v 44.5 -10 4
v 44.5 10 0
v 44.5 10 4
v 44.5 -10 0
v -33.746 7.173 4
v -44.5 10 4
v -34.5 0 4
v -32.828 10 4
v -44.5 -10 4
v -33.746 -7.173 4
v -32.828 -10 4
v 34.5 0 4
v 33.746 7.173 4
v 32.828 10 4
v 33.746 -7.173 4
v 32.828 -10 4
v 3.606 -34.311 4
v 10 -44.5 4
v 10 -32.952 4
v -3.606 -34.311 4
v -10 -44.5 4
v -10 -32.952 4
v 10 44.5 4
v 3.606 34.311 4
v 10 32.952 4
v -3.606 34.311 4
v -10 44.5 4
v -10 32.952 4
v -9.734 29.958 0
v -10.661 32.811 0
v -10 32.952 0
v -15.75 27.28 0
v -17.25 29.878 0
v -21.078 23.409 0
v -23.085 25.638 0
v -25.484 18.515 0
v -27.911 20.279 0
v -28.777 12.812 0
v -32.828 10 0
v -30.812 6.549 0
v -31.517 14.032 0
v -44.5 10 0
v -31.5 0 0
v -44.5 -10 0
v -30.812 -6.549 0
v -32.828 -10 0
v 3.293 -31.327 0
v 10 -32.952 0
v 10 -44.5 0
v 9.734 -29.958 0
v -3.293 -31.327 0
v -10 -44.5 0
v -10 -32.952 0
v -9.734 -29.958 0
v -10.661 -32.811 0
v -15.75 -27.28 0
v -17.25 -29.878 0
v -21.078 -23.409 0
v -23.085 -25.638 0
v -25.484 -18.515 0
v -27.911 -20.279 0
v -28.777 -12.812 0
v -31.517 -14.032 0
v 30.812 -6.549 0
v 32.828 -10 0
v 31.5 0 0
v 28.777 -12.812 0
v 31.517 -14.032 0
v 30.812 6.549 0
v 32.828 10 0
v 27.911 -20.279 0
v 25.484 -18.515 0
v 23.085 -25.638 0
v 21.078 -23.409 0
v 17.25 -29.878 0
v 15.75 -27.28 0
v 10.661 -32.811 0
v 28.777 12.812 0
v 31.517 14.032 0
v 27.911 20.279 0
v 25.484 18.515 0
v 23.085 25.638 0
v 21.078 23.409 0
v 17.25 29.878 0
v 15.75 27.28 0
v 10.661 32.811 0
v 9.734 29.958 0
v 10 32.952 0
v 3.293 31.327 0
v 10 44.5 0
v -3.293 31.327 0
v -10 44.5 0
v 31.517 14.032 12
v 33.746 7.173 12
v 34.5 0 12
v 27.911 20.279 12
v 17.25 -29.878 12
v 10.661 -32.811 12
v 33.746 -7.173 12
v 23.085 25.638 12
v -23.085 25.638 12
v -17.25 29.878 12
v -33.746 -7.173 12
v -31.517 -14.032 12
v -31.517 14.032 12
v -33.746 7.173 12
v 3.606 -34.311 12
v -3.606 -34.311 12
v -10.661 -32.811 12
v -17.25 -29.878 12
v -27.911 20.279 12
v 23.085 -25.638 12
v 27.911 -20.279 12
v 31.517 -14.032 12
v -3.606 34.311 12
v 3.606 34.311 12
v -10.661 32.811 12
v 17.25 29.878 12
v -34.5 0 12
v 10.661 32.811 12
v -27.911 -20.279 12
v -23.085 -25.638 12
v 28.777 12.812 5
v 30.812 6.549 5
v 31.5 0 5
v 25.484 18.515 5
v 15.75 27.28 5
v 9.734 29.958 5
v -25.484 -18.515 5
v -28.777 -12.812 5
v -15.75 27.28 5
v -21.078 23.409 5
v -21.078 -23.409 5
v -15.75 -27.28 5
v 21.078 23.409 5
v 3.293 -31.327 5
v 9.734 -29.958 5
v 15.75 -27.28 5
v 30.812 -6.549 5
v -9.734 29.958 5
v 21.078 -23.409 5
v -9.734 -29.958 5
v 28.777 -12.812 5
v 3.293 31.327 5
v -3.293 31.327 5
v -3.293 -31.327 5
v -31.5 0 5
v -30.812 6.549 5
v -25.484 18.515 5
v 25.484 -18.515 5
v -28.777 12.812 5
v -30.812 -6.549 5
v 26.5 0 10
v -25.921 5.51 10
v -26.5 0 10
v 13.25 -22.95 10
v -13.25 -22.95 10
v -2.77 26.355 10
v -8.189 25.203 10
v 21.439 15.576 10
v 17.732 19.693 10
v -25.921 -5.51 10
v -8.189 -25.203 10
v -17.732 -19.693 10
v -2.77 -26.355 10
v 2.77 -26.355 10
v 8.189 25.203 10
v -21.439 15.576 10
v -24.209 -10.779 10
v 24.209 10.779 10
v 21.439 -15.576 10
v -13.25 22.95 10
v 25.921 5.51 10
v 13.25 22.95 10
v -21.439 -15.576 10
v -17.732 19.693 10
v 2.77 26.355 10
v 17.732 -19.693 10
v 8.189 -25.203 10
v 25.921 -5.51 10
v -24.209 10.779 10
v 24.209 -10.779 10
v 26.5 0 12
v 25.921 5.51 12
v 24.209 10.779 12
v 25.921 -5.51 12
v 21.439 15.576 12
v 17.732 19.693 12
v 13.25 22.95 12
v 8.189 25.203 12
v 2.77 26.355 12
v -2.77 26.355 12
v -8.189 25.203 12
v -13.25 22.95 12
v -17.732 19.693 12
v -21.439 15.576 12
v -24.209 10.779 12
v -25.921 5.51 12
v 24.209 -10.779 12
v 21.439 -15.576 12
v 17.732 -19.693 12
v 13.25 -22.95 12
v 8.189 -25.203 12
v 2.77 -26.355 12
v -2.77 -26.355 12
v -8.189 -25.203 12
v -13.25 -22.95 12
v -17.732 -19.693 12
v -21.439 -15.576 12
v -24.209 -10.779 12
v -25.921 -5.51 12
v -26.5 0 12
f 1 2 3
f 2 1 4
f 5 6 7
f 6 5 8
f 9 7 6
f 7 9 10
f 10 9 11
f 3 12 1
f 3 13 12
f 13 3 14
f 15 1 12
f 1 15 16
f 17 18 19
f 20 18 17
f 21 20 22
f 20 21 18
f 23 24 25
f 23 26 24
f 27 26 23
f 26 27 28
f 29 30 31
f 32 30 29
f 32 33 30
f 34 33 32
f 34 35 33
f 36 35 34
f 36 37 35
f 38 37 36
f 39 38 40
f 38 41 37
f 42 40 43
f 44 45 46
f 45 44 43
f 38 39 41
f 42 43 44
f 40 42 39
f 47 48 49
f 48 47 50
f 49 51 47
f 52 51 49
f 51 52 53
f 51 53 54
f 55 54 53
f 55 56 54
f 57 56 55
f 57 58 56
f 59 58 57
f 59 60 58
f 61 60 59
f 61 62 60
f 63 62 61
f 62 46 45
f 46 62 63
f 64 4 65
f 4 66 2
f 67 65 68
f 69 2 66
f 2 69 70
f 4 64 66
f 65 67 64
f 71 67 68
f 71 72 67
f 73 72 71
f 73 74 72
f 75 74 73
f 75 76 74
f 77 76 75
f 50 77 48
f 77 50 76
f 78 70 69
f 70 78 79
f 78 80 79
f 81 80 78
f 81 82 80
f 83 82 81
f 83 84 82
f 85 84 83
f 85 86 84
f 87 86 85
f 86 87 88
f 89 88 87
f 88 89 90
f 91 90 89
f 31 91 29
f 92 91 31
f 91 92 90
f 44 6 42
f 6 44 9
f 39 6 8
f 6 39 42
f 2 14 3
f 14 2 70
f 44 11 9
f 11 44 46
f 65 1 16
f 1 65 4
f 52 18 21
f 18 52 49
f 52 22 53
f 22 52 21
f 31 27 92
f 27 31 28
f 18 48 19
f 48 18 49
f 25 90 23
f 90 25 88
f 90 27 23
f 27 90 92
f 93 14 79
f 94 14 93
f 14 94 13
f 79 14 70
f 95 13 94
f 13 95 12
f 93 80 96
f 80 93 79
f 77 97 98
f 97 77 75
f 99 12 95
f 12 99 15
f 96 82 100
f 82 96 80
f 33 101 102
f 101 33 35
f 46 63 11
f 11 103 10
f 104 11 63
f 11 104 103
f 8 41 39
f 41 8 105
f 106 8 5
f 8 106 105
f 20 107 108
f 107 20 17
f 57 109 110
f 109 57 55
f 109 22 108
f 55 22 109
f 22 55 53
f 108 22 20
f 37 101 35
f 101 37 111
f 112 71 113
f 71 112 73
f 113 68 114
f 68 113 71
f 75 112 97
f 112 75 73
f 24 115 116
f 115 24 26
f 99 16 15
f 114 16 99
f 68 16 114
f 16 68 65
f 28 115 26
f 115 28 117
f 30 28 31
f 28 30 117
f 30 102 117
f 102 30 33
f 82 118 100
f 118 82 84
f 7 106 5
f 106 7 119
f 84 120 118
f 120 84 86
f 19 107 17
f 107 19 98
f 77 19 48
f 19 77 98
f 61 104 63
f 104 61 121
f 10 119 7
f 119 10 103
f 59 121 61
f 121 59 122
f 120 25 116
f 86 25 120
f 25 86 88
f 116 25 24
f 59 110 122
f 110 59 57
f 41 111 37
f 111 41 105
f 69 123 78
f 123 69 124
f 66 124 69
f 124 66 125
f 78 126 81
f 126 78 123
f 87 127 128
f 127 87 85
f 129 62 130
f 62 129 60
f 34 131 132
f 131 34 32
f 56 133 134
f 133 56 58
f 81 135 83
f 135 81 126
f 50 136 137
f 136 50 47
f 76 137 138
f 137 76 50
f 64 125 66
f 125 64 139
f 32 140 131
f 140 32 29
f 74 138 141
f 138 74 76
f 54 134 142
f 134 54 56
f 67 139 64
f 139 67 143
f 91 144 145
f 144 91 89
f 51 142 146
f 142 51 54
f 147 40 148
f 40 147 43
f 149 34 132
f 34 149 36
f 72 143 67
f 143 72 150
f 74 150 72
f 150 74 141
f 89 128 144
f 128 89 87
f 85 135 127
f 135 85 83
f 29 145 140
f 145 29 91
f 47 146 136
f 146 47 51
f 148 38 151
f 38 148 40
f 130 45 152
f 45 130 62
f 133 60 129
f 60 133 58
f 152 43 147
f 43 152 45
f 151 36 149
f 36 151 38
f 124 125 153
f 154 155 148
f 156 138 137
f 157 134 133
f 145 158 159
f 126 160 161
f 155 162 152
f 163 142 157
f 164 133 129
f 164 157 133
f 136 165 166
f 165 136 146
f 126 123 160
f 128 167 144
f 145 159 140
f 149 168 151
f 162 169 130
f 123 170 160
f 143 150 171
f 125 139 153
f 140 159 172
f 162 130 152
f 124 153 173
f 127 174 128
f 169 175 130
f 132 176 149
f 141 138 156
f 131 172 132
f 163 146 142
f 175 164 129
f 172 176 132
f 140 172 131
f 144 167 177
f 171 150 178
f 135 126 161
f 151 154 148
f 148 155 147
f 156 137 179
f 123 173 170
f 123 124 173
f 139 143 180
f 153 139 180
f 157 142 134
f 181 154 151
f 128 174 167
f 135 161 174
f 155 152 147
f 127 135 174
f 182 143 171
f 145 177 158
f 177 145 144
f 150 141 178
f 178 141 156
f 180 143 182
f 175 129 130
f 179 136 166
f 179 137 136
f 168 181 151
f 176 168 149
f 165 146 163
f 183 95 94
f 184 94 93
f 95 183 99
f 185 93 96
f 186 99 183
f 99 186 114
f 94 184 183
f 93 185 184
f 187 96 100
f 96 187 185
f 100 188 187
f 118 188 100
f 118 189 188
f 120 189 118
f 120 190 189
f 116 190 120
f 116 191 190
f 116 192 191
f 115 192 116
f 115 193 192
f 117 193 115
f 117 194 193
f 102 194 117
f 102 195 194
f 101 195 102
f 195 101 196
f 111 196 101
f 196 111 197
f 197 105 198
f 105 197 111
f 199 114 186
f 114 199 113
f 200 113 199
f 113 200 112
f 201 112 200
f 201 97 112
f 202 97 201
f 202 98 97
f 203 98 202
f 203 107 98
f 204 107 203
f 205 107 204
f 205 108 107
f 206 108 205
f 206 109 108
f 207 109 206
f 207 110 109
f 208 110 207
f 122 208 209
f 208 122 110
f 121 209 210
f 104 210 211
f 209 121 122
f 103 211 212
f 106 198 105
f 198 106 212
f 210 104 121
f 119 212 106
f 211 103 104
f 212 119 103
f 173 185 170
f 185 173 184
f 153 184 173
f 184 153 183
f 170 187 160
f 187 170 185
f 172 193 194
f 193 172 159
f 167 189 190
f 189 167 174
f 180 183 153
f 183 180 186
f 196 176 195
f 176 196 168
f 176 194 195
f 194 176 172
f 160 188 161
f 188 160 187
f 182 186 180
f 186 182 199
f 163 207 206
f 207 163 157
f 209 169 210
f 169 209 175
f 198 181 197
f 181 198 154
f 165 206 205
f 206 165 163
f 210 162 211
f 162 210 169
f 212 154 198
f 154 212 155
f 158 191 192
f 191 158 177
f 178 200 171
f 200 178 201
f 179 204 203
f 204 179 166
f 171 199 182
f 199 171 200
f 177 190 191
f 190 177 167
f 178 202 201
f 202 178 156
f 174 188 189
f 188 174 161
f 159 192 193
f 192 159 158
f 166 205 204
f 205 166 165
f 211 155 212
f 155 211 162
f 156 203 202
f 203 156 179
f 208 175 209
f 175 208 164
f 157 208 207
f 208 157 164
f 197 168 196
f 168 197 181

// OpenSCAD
//outer hole radius
ohr = 53/2;

//outer hole height
ohh = 10;

//inner hole radius
ihr = ohr+5;
echo(ihr);

//inner hole height
ihh = 5;

//wall thickness
wth = 3;

//start with inner hole
difference()
{

//base
union()
{
//cylinder(r=ohr+15, h=2);
translate([0,0,2])
cube([ihr*2+wth*2+20,20,4], center=true);

translate([0,0,2])
rotate([0,0,90])
cube([ihr*2+wth*2+20,20,4], center=true);

cylinder(r=ihr+wth, h=ihh);

}

cylinder(r=ihr, h=ihh);
}


difference()
{
translate([0,0,ihh])
cylinder(r=ihr+wth, h=ihr-ohr);

translate([0,0,ihh])
cylinder(r1=ihr, r2=ohr, h=ihr-ohr);
}


difference()
{
translate([0,0,ihh+ihr-ohr])
cylinder(r=ihr+wth, h=2);

translate([0,0,ihh+ihr-ohr])
cylinder(r=ohr, h=2);
}
